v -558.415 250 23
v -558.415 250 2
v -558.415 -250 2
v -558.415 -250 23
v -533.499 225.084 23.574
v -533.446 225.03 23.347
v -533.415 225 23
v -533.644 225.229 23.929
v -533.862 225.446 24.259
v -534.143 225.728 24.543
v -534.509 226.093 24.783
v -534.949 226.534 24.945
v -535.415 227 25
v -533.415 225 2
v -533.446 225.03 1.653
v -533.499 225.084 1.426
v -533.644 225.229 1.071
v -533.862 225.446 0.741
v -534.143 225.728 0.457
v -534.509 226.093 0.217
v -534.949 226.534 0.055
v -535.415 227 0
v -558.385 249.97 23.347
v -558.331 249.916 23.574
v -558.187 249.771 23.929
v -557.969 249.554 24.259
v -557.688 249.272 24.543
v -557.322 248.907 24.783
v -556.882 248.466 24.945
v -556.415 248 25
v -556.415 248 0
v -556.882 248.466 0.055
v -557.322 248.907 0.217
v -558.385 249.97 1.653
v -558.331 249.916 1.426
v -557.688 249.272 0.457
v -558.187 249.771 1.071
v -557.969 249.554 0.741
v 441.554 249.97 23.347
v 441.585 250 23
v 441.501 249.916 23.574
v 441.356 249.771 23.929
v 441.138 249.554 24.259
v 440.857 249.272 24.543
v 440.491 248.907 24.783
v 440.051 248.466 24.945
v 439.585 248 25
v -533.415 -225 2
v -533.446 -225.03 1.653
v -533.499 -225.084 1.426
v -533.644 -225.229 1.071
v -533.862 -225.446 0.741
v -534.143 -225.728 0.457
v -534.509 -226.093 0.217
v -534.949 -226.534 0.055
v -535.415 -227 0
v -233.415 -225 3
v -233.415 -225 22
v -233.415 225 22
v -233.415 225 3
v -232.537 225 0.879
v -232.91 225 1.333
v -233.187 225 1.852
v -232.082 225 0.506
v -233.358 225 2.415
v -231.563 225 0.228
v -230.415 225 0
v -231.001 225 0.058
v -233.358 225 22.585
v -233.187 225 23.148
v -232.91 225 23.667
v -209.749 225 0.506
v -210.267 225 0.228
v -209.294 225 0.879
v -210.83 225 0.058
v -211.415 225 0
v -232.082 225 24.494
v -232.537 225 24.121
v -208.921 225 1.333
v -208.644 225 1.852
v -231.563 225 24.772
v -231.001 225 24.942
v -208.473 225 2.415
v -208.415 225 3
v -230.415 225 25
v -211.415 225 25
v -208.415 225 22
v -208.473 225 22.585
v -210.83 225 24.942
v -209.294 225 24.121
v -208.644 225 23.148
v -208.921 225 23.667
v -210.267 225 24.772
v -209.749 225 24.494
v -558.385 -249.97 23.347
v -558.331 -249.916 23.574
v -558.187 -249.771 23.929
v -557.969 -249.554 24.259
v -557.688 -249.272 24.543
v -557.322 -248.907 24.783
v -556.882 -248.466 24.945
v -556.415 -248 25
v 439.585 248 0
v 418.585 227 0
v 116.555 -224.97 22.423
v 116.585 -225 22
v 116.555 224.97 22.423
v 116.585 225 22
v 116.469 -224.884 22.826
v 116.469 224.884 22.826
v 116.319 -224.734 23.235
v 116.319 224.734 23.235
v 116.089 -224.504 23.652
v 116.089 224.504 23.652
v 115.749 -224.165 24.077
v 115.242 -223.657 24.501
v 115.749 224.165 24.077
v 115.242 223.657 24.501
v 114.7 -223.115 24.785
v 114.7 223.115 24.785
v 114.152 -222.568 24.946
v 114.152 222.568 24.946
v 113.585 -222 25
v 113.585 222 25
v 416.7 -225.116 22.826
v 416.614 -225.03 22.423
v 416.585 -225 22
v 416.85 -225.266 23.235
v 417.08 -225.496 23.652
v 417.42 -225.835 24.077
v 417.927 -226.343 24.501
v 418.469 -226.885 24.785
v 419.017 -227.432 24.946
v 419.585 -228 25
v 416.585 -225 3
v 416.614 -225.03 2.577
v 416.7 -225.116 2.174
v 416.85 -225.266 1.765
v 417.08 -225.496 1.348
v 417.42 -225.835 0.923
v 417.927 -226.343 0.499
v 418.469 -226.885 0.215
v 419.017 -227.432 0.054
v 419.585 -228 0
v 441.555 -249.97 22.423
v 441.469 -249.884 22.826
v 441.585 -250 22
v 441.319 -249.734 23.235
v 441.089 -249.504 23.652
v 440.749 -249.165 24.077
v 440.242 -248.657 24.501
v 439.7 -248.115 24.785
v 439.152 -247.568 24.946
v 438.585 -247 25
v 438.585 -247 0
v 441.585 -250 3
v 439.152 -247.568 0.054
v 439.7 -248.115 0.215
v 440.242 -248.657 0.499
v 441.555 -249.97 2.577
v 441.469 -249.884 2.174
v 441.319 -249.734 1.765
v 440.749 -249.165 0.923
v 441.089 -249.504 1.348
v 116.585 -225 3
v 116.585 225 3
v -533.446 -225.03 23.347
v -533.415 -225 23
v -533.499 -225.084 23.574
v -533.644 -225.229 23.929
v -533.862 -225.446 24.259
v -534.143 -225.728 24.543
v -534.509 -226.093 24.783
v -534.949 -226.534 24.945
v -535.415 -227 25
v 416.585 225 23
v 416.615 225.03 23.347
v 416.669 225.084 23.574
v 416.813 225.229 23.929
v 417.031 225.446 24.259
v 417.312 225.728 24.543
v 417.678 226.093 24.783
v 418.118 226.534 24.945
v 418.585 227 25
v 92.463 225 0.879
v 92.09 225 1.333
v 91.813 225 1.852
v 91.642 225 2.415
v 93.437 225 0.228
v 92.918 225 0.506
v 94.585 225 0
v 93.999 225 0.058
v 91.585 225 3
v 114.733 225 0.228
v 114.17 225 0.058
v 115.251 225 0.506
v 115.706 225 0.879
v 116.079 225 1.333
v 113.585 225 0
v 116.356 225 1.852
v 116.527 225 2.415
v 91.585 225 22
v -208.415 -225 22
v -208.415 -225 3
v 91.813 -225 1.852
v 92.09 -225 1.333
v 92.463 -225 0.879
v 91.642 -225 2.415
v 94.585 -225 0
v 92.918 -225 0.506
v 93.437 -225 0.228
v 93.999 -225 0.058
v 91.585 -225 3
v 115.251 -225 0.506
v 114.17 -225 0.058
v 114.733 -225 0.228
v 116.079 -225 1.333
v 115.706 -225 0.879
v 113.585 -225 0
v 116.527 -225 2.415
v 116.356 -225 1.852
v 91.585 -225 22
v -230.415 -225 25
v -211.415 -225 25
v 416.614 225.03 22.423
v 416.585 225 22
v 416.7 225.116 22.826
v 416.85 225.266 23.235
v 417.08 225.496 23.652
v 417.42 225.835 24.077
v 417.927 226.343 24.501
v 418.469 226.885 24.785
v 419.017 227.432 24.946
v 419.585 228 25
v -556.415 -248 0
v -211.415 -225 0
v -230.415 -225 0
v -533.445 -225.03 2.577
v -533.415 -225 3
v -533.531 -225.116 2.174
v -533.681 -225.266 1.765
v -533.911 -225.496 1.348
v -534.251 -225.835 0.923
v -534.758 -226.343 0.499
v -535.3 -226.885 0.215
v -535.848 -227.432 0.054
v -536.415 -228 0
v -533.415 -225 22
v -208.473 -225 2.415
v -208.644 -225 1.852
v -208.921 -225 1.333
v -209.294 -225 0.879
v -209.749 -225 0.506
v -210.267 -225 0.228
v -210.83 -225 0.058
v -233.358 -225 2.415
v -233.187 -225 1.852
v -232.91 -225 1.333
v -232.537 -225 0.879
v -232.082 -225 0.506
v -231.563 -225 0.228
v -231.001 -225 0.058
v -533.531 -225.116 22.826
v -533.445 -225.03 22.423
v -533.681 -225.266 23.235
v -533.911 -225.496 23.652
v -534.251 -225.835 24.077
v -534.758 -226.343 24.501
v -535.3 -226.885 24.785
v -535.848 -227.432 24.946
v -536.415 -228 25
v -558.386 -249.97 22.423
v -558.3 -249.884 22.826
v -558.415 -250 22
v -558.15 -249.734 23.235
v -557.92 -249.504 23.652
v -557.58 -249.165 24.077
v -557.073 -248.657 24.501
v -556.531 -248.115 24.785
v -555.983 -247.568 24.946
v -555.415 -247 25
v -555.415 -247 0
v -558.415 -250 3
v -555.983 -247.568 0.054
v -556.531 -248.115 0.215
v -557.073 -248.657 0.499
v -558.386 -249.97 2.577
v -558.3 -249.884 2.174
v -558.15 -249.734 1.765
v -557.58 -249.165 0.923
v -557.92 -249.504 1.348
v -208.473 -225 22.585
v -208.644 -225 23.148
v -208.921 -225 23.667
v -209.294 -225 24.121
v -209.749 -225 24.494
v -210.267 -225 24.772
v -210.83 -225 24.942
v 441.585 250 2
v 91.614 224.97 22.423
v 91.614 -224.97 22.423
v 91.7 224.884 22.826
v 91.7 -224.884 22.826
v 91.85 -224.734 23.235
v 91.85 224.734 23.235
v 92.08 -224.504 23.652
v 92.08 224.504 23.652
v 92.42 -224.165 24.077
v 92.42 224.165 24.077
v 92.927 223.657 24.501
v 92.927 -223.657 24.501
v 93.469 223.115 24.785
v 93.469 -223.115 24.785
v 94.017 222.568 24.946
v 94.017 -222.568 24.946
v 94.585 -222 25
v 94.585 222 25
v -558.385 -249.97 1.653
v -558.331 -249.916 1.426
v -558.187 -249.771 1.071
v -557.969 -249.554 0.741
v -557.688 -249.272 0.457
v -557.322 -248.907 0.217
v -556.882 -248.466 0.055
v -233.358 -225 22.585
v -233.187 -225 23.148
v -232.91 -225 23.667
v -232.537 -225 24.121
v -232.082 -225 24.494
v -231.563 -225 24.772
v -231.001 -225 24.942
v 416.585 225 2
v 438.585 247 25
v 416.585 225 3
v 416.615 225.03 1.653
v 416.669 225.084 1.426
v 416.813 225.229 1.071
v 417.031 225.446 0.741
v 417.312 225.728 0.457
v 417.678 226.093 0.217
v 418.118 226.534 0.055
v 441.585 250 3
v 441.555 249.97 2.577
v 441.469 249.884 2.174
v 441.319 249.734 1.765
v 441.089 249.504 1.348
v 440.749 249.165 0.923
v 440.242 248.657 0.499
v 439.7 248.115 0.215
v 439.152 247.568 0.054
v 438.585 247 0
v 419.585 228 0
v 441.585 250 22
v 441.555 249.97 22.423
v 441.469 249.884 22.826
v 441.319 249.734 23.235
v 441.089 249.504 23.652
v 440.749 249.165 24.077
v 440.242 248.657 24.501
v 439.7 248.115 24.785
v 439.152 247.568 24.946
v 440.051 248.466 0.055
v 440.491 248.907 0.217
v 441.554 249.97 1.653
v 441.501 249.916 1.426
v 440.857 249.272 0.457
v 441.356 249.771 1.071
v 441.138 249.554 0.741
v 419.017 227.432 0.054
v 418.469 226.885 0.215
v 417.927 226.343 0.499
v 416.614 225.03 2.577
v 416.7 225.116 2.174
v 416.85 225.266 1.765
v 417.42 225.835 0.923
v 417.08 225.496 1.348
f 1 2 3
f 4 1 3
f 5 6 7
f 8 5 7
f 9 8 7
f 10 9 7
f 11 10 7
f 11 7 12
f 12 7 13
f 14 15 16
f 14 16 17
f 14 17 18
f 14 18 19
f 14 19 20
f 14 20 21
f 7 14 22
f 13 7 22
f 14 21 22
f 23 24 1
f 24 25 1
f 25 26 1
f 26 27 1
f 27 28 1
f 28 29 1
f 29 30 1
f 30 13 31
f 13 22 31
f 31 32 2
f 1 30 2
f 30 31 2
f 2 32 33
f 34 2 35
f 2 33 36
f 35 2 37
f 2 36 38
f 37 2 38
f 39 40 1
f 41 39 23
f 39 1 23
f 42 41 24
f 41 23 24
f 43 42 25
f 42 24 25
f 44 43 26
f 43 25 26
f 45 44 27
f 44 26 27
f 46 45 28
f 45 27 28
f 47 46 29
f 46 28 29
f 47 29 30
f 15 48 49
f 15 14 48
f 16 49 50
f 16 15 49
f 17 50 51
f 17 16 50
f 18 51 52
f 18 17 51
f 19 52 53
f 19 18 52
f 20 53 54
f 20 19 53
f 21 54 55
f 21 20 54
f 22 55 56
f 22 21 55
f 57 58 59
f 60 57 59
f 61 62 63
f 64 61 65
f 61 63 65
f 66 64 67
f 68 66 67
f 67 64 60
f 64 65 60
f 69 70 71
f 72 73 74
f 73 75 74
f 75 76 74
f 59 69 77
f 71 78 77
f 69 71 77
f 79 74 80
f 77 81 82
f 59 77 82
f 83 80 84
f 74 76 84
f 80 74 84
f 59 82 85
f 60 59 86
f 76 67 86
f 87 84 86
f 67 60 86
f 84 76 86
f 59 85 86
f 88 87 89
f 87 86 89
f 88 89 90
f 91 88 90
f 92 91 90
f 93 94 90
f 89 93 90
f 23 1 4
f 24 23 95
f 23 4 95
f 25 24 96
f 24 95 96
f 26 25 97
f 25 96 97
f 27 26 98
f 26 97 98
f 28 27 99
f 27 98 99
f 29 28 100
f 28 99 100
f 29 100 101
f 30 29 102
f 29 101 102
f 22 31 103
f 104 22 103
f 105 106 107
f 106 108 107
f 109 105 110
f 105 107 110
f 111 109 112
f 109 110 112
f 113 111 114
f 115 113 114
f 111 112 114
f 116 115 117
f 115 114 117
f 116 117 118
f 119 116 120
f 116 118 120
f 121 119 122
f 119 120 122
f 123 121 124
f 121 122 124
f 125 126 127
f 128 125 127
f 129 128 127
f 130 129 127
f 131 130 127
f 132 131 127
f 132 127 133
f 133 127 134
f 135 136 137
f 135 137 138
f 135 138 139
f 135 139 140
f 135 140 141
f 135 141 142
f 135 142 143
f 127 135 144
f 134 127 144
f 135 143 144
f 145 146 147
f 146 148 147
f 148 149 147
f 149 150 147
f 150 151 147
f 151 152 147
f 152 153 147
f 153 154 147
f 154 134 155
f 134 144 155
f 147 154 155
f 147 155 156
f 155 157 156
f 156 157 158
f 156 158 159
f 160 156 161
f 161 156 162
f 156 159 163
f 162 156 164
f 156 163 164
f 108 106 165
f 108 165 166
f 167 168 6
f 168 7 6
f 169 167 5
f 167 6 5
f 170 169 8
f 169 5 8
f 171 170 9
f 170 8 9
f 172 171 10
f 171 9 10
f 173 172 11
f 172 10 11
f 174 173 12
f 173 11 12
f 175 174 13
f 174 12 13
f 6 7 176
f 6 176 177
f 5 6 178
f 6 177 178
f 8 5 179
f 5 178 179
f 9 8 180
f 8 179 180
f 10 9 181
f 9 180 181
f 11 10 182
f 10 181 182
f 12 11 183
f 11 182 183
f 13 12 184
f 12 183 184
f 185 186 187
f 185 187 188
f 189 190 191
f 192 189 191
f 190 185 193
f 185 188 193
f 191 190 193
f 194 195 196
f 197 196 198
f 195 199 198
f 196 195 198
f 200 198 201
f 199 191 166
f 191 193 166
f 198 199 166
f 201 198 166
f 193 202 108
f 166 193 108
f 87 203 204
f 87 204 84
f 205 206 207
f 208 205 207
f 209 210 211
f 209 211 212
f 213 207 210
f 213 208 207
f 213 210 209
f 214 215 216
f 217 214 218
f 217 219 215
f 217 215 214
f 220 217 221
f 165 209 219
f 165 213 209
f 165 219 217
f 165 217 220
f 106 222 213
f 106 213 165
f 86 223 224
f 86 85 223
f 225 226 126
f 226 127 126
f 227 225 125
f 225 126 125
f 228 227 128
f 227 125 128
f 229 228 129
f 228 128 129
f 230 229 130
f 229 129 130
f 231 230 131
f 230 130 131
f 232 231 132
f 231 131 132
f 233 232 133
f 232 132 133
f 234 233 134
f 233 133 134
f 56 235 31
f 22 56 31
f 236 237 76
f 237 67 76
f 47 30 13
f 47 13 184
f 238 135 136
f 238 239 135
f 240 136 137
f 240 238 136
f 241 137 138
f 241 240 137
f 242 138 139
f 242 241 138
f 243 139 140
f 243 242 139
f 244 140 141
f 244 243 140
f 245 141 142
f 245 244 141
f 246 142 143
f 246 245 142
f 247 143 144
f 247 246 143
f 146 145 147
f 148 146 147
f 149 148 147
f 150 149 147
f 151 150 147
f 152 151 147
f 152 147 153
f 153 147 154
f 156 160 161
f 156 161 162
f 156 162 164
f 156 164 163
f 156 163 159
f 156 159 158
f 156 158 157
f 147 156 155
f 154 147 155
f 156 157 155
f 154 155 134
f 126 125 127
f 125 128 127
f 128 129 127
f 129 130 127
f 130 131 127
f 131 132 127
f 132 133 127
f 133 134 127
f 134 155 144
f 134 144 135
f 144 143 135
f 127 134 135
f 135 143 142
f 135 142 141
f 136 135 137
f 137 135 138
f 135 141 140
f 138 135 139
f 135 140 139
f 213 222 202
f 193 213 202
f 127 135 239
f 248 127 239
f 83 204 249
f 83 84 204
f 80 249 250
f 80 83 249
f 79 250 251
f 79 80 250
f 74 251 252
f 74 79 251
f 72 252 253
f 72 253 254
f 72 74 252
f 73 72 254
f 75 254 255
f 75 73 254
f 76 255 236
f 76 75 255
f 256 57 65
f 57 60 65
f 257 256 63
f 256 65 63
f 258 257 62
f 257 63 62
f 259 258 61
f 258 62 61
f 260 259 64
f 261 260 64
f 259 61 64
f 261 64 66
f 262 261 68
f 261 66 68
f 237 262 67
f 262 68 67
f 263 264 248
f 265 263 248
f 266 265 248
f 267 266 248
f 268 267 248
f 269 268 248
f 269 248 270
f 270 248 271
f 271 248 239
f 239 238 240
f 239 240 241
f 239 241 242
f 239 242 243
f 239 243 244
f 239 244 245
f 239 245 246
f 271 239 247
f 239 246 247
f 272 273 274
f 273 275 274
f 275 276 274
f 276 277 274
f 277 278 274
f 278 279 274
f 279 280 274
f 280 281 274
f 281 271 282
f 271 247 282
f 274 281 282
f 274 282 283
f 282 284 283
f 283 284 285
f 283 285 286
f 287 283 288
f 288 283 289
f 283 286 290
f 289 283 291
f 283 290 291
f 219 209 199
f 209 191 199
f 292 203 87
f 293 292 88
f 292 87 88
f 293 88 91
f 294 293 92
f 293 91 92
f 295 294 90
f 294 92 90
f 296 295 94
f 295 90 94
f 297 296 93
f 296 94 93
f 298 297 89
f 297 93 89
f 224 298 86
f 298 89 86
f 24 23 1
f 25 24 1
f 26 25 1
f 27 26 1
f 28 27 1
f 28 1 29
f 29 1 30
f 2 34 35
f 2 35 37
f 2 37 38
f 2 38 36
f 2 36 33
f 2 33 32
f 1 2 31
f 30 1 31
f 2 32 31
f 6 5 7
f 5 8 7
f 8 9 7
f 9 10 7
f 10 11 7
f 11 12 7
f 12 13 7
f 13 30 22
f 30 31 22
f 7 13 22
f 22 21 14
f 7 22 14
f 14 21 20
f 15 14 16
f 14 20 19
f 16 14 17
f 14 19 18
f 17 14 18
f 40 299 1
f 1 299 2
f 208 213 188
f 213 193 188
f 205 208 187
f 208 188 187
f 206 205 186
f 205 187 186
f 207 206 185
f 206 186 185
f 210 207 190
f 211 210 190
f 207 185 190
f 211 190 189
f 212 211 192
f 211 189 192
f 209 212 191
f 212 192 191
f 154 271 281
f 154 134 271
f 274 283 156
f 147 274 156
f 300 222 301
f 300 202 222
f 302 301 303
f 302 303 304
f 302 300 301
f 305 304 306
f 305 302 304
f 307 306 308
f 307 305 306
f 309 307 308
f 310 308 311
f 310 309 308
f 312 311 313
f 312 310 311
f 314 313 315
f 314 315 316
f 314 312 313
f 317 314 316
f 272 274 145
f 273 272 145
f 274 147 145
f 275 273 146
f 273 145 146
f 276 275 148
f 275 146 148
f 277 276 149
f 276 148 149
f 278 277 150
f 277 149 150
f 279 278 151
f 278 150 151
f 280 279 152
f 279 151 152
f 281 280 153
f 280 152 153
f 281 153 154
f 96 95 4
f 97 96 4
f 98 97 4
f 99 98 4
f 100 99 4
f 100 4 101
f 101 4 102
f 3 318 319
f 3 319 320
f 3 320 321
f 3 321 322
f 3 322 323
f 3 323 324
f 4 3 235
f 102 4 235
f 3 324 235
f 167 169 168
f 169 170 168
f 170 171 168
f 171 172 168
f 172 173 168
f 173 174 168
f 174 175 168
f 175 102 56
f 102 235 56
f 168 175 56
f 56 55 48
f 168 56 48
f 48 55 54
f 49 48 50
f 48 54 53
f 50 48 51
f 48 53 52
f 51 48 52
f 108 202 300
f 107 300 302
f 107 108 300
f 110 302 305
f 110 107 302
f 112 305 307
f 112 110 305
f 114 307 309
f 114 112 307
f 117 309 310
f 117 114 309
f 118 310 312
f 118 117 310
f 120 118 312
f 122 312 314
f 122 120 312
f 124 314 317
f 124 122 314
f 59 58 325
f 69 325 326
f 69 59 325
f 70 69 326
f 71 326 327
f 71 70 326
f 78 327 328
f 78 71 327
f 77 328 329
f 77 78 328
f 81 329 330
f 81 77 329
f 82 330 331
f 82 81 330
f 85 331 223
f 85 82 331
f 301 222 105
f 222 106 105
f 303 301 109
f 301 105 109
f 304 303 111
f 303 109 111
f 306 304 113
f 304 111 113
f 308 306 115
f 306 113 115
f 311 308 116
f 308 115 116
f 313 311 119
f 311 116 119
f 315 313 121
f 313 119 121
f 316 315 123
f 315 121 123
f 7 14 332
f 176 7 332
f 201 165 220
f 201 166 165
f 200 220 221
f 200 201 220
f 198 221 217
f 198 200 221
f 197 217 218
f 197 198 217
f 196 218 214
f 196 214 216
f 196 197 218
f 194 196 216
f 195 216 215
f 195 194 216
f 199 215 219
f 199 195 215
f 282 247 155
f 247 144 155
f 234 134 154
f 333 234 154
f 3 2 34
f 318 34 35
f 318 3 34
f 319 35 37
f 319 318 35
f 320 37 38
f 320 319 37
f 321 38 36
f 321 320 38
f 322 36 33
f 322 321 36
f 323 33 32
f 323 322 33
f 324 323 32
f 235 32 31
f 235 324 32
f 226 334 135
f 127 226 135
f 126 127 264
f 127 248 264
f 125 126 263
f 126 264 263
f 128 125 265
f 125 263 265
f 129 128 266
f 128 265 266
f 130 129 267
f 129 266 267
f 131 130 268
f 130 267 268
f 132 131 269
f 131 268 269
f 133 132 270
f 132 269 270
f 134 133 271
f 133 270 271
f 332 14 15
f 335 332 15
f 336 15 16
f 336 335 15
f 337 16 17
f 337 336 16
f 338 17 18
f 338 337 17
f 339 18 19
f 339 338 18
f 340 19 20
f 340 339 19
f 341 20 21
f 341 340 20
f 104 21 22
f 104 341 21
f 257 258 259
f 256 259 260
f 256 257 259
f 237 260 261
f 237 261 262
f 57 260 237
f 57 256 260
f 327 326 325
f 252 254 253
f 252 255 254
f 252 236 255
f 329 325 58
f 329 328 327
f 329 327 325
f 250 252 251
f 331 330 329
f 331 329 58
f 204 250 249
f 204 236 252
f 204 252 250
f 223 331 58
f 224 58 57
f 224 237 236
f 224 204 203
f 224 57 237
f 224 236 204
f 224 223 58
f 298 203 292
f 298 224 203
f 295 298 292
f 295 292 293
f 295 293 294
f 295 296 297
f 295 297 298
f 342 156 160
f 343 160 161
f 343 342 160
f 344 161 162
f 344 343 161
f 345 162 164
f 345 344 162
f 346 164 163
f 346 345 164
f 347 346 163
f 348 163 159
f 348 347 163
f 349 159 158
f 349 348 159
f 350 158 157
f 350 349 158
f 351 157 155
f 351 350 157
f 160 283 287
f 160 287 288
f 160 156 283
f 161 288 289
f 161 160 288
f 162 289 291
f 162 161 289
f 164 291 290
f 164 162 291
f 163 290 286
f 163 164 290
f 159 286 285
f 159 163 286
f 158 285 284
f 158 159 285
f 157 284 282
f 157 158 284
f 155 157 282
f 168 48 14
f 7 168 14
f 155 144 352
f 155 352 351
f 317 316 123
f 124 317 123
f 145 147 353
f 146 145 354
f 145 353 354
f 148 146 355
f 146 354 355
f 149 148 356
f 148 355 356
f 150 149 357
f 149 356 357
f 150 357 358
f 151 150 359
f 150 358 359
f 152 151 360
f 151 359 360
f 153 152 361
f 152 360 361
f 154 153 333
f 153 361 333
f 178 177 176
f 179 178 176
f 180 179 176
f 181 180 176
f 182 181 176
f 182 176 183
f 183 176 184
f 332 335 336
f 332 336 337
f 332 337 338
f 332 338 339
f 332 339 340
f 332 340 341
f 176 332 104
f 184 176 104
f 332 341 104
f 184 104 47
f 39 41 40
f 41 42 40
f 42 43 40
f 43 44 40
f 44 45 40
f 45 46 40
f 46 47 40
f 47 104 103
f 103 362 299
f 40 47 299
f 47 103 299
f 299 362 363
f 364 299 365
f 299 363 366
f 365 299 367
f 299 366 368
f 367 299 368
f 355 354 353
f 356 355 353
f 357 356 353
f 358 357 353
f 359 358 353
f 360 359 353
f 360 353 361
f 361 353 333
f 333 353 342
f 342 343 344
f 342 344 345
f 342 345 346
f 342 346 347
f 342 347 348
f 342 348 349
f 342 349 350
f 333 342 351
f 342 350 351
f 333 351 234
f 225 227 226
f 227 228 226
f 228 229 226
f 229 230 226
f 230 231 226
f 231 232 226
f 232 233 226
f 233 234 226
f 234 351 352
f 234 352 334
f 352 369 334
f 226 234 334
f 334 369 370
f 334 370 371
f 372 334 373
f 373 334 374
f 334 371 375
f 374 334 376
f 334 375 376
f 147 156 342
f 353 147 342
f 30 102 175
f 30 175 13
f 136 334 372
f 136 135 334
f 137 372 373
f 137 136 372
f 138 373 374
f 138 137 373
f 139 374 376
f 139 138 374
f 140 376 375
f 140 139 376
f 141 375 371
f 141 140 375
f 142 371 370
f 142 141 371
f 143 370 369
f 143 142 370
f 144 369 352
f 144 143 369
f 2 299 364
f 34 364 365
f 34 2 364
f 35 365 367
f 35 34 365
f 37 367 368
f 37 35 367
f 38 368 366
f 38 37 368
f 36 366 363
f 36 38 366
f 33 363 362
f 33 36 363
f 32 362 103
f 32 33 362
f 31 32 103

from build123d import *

# Parameters (mm, degrees)
F1_DEPTH  = 25
F2_R      = 2
F4_DEPTH  = 25
F5_R      = 2
F7_DEPTH  = 25
F8_R      = 3
F10_DEPTH = 25
F11_R     = 3
F12_W     = 25
F12_H     = 450
F13_DEPTH = 25
F14_R     = 3


with BuildPart() as f1:
    # F0 (on Top) → F1 (new body)
    with BuildSketch(Plane.XY):
        Polygon((-533.415433, 225), (-558.415433, 250), (-558.415433, -250), (-533.415433, -225), align=None)
    extrude(amount=F1_DEPTH)

    # F2
    f2_edges = [f1.edges().sort_by_distance(p)[0] for p in [
        (-533.415433, 0, 25),
        (-533.415433, 0, 0),
        (-558.415433, 0, 0),
        (-558.415433, 0, 25),
    ]]
    fillet(f2_edges, radius=F2_R)


with BuildPart() as f4:
    # F3 (on Top) → F4 (new body)
    with BuildSketch(Plane.XY):
        Polygon((441.584567, 250), (-558.415433, 250), (-533.415433, 225), (416.584567, 225), align=None)
    extrude(amount=F4_DEPTH)

    # F5
    f5_edges = [f4.edges().sort_by_distance(p)[0] for p in [
        (-58.415433, 225, 25),
        (-58.415433, 250, 25),
        (-58.415433, 250, 0),
        (-58.415433, 225, 0),
    ]]
    fillet(f5_edges, radius=F5_R)


with BuildPart() as f7:
    # F6 (on Top) → F7 (new body)
    with BuildSketch(Plane.XY):
        Polygon((-533.415433, -225), (-558.415433, -250), (441.584567, -250), (416.584567, -225), align=None)
    extrude(amount=F7_DEPTH)

    # F8
    f8_edges = [f7.edges().sort_by_distance(p)[0] for p in [
        (-58.415433, -250, 25),
        (-58.415433, -225, 25),
        (-58.415433, -250, 0),
        (-58.415433, -225, 0),
    ]]
    fillet(f8_edges, radius=F8_R)


with BuildPart() as f10:
    # F9 (on Top) → F10 (new body)
    with BuildSketch(Plane.XY):
        Polygon((416.584567, -225), (441.584567, -250), (441.584567, 250), (416.584567, 225), align=None)
    extrude(amount=F10_DEPTH)

    # F11
    f11_edges = [f10.edges().sort_by_distance(p)[0] for p in [
        (441.584567, 0, 25),
        (416.584567, 0, 25),
        (441.584567, 0, 0),
        (416.584567, 0, 0),
    ]]
    fillet(f11_edges, radius=F11_R)


with BuildPart() as f13:
    # F12 (on face) → F13 (new body)
    with BuildSketch(Plane.XY.offset(25)):
        with Locations((-220.915433, 0)):
            Rectangle(F12_W, F12_H)
        with Locations((104.084567, 0)):
            Rectangle(F12_W, F12_H)
    extrude(amount=-F13_DEPTH)

    # F14
    f14_edges = [f13.edges().sort_by_distance(p)[0] for p in [
        (-208.415433, 0, 25),
        (-233.415433, 0, 25),
        (-208.415433, 0, 0),
        (104.084567, 225, 25),
        (91.584567, 0, 25),
        (104.084567, -225, 25),
        (116.584567, 0, 25),
        (116.584567, 0, 0),
        (91.584567, 0, 0),
        (-233.415433, 0, 0),
    ]]
    fillet(f14_edges, radius=F14_R)


solid = Compound([f1.part, f4.part, f7.part, f10.part, f13.part])
